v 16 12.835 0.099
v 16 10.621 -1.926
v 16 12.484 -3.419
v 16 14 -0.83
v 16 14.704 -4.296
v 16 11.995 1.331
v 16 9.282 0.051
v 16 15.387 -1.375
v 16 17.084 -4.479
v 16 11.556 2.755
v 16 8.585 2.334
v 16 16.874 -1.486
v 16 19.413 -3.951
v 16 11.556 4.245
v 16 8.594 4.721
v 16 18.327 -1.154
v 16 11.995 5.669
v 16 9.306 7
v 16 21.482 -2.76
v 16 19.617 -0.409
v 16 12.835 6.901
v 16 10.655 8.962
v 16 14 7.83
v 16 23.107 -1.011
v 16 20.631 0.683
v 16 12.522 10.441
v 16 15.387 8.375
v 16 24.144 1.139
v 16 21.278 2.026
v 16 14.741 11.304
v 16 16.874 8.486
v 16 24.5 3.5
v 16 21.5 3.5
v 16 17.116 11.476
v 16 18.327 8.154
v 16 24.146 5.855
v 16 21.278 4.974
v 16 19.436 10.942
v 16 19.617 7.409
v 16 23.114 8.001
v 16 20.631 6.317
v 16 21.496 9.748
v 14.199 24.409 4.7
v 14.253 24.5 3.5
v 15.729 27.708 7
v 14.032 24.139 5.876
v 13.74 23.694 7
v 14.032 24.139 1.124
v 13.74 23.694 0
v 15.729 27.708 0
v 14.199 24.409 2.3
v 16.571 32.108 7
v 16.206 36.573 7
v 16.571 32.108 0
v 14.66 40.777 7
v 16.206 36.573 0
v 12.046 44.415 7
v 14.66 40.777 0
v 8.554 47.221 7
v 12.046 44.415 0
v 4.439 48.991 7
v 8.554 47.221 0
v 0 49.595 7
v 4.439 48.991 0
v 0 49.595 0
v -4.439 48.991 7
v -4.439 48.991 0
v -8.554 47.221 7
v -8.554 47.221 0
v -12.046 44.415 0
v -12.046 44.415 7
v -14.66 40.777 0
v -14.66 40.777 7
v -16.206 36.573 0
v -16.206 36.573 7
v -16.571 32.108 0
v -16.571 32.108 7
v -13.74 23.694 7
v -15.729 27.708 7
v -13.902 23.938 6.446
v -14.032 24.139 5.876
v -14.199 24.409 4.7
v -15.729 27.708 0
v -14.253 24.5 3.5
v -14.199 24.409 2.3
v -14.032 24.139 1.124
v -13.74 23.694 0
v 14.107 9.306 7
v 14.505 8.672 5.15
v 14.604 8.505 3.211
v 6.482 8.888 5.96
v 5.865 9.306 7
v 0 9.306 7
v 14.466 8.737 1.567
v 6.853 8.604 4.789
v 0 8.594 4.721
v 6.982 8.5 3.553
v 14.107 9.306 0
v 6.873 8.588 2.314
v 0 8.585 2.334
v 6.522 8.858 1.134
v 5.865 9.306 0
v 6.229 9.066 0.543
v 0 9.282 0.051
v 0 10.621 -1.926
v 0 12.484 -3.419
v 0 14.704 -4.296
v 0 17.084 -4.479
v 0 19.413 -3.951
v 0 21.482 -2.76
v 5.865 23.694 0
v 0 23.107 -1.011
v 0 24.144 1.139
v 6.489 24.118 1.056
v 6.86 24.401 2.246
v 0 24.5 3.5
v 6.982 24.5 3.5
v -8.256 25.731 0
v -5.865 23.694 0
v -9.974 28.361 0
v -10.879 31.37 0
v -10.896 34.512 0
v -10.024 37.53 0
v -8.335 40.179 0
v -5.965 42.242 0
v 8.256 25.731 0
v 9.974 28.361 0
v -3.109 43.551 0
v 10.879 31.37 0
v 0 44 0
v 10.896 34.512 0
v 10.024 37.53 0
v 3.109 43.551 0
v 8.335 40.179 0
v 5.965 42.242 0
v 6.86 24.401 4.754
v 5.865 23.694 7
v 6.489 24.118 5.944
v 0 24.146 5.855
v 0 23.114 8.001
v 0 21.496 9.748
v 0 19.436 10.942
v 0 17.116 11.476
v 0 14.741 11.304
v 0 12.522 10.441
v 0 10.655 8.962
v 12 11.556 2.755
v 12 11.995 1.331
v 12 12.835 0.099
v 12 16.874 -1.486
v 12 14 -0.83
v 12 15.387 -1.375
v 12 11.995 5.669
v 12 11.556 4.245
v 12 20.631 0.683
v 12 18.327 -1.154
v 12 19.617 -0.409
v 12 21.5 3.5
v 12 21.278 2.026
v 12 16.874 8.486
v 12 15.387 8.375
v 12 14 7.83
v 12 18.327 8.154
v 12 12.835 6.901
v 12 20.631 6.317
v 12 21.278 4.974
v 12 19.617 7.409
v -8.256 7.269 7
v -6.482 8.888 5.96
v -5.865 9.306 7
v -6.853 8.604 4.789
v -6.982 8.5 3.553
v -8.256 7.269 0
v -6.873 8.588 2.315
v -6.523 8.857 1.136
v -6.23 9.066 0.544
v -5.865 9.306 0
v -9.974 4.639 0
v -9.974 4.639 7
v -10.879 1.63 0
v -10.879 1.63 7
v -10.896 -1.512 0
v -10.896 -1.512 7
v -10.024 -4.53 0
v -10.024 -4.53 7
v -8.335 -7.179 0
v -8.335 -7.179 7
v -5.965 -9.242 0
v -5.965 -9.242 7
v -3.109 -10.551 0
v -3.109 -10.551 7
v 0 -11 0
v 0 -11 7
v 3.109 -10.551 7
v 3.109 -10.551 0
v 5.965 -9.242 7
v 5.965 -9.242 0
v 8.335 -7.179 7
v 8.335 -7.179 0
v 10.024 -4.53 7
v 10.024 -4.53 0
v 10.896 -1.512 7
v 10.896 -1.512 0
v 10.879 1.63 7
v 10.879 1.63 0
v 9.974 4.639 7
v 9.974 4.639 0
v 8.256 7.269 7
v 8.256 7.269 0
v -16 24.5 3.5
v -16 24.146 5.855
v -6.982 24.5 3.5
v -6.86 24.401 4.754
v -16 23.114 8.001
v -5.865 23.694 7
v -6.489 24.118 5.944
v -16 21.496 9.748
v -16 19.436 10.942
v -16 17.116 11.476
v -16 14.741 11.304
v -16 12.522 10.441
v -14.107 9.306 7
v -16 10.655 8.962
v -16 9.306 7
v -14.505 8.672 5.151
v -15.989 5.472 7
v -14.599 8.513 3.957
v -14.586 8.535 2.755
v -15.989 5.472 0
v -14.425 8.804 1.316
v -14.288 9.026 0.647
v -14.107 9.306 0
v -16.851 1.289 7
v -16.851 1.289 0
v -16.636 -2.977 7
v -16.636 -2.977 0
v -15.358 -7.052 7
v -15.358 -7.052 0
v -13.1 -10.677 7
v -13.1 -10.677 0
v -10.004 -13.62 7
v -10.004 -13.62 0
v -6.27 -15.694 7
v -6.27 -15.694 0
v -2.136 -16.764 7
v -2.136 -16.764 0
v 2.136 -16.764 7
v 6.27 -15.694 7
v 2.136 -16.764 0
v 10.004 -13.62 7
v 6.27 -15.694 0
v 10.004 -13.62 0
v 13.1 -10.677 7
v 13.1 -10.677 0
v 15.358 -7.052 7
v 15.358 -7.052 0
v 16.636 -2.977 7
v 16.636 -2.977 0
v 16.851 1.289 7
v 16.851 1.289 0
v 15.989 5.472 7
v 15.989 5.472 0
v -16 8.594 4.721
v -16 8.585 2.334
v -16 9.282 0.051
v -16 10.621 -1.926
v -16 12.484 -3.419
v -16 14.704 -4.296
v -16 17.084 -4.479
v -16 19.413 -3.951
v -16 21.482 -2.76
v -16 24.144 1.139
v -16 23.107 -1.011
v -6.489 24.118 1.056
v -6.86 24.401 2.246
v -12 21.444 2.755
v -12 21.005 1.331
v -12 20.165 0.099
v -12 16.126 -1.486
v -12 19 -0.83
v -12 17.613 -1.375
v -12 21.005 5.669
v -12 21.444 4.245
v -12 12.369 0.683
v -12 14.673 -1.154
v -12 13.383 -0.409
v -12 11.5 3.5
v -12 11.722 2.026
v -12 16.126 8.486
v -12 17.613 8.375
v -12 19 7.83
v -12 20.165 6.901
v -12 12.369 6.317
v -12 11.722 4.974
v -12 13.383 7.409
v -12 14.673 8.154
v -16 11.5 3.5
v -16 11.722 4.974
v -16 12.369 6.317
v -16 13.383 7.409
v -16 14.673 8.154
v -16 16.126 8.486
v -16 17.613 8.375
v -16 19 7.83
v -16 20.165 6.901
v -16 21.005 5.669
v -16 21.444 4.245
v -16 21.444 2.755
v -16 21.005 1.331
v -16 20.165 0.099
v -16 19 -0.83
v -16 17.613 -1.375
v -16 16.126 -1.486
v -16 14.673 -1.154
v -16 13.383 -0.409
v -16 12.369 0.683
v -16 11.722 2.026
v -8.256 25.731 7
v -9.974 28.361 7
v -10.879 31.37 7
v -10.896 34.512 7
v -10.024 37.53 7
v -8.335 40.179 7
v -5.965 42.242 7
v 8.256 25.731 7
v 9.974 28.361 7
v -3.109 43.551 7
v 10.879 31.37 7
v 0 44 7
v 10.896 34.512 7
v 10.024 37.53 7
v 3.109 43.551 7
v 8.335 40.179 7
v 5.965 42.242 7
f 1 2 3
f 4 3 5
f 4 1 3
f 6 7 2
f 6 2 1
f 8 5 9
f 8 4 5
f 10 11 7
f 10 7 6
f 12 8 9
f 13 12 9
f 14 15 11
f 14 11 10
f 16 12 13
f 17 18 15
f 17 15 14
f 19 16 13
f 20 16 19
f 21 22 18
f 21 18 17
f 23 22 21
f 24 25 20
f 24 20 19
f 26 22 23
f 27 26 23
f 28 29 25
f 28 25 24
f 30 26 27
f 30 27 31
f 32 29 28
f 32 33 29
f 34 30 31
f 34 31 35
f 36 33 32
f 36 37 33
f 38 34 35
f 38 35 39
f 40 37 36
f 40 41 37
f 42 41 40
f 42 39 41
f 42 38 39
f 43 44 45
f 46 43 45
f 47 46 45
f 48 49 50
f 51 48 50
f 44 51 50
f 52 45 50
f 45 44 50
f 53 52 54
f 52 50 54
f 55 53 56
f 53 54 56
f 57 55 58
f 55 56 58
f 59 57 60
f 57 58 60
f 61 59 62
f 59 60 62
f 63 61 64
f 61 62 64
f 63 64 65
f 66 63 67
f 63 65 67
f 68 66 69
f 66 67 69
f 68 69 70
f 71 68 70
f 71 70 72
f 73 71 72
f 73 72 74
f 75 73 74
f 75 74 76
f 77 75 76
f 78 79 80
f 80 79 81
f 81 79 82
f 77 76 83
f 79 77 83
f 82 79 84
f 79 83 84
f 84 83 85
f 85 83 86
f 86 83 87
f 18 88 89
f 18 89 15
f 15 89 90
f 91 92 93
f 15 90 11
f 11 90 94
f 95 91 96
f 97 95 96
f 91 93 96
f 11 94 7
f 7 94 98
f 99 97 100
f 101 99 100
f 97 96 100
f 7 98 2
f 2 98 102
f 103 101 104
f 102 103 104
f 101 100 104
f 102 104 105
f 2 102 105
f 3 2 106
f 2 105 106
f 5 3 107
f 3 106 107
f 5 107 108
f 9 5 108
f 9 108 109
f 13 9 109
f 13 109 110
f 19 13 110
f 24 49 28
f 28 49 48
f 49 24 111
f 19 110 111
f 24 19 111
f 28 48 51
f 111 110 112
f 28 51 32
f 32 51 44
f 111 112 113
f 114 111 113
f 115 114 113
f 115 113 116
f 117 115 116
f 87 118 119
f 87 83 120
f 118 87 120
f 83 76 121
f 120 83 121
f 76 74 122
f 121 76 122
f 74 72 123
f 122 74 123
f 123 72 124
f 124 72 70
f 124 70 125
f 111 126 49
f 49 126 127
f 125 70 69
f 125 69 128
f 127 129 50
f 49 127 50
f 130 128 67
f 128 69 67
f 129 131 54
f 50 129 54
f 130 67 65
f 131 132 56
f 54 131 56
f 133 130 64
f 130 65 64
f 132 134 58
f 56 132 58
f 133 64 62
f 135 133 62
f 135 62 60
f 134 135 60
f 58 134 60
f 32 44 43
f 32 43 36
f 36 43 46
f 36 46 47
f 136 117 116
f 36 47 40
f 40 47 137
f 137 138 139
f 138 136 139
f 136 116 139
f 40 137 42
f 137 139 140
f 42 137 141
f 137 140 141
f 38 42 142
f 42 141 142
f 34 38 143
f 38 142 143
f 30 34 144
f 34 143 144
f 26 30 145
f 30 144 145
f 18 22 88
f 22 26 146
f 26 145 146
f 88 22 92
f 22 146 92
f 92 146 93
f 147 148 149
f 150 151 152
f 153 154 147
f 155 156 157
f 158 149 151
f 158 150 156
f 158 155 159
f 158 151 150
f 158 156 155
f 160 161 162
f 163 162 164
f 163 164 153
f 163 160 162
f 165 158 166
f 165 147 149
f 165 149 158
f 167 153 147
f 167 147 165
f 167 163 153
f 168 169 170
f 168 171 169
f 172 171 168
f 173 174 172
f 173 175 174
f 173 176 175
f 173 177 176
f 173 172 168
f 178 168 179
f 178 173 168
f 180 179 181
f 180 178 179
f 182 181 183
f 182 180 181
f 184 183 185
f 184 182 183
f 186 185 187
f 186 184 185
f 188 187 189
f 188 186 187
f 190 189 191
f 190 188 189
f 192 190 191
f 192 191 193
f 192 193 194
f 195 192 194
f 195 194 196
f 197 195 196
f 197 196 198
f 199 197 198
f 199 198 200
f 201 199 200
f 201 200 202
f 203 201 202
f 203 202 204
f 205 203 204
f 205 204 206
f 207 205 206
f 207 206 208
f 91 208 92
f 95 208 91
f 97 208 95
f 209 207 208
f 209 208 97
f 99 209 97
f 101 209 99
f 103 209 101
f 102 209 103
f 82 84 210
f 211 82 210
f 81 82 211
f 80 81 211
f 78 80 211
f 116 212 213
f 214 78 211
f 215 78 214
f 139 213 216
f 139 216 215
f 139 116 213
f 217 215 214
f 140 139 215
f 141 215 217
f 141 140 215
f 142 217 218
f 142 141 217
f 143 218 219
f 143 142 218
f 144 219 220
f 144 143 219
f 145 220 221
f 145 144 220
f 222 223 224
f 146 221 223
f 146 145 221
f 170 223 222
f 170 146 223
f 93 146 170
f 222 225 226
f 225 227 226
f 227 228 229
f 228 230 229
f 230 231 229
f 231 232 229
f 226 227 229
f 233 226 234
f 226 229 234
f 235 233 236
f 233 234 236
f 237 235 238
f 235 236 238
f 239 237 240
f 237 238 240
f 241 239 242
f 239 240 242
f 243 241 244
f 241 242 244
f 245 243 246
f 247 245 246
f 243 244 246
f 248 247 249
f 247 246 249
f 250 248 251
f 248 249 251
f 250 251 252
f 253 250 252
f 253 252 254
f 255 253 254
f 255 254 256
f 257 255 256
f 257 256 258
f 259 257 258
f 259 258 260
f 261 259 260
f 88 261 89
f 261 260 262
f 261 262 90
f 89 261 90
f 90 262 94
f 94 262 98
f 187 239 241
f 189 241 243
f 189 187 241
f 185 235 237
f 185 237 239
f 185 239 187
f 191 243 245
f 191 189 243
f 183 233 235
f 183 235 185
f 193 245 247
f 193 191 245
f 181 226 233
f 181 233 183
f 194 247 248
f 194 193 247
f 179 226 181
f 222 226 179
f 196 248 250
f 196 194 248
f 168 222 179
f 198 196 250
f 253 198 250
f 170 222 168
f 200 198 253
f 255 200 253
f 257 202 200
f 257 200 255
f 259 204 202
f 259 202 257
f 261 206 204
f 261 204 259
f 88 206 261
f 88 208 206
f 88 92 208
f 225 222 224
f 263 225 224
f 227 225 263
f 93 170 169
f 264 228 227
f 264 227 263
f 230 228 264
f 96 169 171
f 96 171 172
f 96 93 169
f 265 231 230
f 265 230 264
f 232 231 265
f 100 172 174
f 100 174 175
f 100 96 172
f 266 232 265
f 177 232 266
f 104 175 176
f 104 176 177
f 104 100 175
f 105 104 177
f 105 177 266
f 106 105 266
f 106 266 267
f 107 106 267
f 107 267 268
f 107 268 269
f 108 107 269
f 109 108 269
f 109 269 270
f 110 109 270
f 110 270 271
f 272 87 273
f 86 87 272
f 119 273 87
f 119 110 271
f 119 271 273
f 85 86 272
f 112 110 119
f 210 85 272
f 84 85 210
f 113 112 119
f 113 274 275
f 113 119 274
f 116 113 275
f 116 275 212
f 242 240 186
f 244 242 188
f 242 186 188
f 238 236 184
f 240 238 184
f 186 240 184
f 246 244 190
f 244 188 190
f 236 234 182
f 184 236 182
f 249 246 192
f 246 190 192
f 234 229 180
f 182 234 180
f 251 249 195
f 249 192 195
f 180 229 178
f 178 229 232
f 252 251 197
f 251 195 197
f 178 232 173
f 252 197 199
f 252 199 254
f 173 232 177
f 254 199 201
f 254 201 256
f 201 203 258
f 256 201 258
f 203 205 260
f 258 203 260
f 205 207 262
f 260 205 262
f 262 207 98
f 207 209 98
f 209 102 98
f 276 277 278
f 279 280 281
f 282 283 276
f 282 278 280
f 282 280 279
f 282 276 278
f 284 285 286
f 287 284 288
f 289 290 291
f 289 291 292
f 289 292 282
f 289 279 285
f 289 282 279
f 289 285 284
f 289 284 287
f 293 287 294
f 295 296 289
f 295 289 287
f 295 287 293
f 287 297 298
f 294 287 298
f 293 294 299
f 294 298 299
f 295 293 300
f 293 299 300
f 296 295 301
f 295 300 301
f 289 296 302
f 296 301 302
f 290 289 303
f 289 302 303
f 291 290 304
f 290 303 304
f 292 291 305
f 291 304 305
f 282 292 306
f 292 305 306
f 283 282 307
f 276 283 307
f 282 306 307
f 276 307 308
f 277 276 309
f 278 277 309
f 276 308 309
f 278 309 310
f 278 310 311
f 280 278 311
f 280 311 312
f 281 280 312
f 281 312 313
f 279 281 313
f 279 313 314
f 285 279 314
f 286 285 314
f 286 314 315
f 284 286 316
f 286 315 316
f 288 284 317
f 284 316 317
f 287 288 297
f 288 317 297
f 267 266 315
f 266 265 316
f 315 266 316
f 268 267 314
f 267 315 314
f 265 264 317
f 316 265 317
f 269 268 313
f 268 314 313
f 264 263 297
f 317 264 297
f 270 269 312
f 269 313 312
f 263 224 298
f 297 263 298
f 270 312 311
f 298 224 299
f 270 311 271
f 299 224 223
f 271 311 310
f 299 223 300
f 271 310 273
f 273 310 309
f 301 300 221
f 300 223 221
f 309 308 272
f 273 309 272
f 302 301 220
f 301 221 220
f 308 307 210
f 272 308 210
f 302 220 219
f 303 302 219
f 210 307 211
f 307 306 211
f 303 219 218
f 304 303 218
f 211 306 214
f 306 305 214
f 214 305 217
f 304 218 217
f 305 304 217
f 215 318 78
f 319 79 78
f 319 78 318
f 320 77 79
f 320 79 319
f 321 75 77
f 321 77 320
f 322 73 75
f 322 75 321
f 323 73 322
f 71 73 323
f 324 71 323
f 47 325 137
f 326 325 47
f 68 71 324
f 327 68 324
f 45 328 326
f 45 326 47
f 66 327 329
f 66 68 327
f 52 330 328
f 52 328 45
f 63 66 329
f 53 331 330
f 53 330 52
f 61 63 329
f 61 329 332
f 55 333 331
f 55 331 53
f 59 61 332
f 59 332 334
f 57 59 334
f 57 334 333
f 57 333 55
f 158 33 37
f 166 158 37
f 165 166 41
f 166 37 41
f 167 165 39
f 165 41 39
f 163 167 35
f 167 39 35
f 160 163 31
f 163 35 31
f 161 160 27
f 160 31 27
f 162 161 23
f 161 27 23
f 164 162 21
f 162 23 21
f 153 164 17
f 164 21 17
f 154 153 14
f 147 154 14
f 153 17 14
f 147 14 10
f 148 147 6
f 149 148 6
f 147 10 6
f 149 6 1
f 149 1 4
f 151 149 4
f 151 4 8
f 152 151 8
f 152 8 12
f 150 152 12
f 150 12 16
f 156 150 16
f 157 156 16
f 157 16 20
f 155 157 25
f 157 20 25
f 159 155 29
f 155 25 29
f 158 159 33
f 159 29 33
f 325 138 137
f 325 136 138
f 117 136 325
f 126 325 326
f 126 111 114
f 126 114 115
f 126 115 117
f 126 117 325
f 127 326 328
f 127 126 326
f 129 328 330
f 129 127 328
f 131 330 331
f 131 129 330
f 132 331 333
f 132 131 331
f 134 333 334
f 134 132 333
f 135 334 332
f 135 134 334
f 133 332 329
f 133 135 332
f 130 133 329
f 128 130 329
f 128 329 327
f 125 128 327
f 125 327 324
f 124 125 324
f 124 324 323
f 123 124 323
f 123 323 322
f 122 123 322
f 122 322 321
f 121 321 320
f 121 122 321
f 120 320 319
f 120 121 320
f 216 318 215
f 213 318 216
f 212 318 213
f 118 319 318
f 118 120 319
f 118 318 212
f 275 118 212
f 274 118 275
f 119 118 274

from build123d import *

# Parameters (mm, degrees)
F0_R          = 11
F1_DEPTH      = 7
F3_DEPTH      = 16
F3_DEPTH_BACK = 16
F4_R          = 5
F5_DEPTH      = 4
F6_R          = 5
F7_DEPTH      = 4


# Not quite as in the source:
# - a feature of the source that left no trace in its solid (it failed there, or was rolled back) is left out


with BuildPart() as f1:
    # F0 (on Top) → F1 (new body)
    with BuildSketch(Plane.XY):
        with BuildLine():
            ThreePointArc((13.2046790968, 10.5469991105), (14.5476279215, 16.7175814785), (13.1493192392, 22.8758548676))
            ThreePointArc((13.1493192392, 22.8758548676), (0, 49.5952677326), (-13.1493192392, 22.8758548676))
            ThreePointArc((-13.1493192392, 22.8758548676), (-14.5476279215, 16.7175814785), (-13.2046790968, 10.5469991105))
            ThreePointArc((-13.2046790968, 10.5469991105), (0, -16.8997852142), (13.2046790968, 10.5469991105))
        make_face()
        Circle(F0_R, mode=Mode.SUBTRACT)
        with Locations((0, 33)):
            Circle(F0_R, mode=Mode.SUBTRACT)
    extrude(amount=F1_DEPTH)

    # F2 (on Right) → F3 (join, two sides)
    with BuildSketch(Plane.YZ) as f3_sk:
        with BuildLine():
            ThreePointArc((9.306252715, 7), (14.7041684767, -4.2958315233), (24.5, 3.5))
            ThreePointArc((24.5, 3.5), (18.2958315233, 11.2958315233), (9.306252715, 7))
        make_face()
    extrude(amount=F3_DEPTH)
    extrude(f3_sk.sketch, amount=-F3_DEPTH_BACK)

    # F4 (on face) → F5 (cut)
    with BuildSketch(Plane.YZ.offset(16)):
        with Locations((16.5, 3.5)):
            Circle(F4_R)
    extrude(amount=-F5_DEPTH, mode=Mode.SUBTRACT)

    # F6 (on face) → F7 (cut)
    with BuildSketch(Plane(origin=(-16, 0, 0), x_dir=(0, -1, 0), z_dir=(-1, 0, 0))):
        with Locations((-16.5, 3.5)):
            Circle(F6_R)
    extrude(amount=-F7_DEPTH, mode=Mode.SUBTRACT)


solid = f1.part
